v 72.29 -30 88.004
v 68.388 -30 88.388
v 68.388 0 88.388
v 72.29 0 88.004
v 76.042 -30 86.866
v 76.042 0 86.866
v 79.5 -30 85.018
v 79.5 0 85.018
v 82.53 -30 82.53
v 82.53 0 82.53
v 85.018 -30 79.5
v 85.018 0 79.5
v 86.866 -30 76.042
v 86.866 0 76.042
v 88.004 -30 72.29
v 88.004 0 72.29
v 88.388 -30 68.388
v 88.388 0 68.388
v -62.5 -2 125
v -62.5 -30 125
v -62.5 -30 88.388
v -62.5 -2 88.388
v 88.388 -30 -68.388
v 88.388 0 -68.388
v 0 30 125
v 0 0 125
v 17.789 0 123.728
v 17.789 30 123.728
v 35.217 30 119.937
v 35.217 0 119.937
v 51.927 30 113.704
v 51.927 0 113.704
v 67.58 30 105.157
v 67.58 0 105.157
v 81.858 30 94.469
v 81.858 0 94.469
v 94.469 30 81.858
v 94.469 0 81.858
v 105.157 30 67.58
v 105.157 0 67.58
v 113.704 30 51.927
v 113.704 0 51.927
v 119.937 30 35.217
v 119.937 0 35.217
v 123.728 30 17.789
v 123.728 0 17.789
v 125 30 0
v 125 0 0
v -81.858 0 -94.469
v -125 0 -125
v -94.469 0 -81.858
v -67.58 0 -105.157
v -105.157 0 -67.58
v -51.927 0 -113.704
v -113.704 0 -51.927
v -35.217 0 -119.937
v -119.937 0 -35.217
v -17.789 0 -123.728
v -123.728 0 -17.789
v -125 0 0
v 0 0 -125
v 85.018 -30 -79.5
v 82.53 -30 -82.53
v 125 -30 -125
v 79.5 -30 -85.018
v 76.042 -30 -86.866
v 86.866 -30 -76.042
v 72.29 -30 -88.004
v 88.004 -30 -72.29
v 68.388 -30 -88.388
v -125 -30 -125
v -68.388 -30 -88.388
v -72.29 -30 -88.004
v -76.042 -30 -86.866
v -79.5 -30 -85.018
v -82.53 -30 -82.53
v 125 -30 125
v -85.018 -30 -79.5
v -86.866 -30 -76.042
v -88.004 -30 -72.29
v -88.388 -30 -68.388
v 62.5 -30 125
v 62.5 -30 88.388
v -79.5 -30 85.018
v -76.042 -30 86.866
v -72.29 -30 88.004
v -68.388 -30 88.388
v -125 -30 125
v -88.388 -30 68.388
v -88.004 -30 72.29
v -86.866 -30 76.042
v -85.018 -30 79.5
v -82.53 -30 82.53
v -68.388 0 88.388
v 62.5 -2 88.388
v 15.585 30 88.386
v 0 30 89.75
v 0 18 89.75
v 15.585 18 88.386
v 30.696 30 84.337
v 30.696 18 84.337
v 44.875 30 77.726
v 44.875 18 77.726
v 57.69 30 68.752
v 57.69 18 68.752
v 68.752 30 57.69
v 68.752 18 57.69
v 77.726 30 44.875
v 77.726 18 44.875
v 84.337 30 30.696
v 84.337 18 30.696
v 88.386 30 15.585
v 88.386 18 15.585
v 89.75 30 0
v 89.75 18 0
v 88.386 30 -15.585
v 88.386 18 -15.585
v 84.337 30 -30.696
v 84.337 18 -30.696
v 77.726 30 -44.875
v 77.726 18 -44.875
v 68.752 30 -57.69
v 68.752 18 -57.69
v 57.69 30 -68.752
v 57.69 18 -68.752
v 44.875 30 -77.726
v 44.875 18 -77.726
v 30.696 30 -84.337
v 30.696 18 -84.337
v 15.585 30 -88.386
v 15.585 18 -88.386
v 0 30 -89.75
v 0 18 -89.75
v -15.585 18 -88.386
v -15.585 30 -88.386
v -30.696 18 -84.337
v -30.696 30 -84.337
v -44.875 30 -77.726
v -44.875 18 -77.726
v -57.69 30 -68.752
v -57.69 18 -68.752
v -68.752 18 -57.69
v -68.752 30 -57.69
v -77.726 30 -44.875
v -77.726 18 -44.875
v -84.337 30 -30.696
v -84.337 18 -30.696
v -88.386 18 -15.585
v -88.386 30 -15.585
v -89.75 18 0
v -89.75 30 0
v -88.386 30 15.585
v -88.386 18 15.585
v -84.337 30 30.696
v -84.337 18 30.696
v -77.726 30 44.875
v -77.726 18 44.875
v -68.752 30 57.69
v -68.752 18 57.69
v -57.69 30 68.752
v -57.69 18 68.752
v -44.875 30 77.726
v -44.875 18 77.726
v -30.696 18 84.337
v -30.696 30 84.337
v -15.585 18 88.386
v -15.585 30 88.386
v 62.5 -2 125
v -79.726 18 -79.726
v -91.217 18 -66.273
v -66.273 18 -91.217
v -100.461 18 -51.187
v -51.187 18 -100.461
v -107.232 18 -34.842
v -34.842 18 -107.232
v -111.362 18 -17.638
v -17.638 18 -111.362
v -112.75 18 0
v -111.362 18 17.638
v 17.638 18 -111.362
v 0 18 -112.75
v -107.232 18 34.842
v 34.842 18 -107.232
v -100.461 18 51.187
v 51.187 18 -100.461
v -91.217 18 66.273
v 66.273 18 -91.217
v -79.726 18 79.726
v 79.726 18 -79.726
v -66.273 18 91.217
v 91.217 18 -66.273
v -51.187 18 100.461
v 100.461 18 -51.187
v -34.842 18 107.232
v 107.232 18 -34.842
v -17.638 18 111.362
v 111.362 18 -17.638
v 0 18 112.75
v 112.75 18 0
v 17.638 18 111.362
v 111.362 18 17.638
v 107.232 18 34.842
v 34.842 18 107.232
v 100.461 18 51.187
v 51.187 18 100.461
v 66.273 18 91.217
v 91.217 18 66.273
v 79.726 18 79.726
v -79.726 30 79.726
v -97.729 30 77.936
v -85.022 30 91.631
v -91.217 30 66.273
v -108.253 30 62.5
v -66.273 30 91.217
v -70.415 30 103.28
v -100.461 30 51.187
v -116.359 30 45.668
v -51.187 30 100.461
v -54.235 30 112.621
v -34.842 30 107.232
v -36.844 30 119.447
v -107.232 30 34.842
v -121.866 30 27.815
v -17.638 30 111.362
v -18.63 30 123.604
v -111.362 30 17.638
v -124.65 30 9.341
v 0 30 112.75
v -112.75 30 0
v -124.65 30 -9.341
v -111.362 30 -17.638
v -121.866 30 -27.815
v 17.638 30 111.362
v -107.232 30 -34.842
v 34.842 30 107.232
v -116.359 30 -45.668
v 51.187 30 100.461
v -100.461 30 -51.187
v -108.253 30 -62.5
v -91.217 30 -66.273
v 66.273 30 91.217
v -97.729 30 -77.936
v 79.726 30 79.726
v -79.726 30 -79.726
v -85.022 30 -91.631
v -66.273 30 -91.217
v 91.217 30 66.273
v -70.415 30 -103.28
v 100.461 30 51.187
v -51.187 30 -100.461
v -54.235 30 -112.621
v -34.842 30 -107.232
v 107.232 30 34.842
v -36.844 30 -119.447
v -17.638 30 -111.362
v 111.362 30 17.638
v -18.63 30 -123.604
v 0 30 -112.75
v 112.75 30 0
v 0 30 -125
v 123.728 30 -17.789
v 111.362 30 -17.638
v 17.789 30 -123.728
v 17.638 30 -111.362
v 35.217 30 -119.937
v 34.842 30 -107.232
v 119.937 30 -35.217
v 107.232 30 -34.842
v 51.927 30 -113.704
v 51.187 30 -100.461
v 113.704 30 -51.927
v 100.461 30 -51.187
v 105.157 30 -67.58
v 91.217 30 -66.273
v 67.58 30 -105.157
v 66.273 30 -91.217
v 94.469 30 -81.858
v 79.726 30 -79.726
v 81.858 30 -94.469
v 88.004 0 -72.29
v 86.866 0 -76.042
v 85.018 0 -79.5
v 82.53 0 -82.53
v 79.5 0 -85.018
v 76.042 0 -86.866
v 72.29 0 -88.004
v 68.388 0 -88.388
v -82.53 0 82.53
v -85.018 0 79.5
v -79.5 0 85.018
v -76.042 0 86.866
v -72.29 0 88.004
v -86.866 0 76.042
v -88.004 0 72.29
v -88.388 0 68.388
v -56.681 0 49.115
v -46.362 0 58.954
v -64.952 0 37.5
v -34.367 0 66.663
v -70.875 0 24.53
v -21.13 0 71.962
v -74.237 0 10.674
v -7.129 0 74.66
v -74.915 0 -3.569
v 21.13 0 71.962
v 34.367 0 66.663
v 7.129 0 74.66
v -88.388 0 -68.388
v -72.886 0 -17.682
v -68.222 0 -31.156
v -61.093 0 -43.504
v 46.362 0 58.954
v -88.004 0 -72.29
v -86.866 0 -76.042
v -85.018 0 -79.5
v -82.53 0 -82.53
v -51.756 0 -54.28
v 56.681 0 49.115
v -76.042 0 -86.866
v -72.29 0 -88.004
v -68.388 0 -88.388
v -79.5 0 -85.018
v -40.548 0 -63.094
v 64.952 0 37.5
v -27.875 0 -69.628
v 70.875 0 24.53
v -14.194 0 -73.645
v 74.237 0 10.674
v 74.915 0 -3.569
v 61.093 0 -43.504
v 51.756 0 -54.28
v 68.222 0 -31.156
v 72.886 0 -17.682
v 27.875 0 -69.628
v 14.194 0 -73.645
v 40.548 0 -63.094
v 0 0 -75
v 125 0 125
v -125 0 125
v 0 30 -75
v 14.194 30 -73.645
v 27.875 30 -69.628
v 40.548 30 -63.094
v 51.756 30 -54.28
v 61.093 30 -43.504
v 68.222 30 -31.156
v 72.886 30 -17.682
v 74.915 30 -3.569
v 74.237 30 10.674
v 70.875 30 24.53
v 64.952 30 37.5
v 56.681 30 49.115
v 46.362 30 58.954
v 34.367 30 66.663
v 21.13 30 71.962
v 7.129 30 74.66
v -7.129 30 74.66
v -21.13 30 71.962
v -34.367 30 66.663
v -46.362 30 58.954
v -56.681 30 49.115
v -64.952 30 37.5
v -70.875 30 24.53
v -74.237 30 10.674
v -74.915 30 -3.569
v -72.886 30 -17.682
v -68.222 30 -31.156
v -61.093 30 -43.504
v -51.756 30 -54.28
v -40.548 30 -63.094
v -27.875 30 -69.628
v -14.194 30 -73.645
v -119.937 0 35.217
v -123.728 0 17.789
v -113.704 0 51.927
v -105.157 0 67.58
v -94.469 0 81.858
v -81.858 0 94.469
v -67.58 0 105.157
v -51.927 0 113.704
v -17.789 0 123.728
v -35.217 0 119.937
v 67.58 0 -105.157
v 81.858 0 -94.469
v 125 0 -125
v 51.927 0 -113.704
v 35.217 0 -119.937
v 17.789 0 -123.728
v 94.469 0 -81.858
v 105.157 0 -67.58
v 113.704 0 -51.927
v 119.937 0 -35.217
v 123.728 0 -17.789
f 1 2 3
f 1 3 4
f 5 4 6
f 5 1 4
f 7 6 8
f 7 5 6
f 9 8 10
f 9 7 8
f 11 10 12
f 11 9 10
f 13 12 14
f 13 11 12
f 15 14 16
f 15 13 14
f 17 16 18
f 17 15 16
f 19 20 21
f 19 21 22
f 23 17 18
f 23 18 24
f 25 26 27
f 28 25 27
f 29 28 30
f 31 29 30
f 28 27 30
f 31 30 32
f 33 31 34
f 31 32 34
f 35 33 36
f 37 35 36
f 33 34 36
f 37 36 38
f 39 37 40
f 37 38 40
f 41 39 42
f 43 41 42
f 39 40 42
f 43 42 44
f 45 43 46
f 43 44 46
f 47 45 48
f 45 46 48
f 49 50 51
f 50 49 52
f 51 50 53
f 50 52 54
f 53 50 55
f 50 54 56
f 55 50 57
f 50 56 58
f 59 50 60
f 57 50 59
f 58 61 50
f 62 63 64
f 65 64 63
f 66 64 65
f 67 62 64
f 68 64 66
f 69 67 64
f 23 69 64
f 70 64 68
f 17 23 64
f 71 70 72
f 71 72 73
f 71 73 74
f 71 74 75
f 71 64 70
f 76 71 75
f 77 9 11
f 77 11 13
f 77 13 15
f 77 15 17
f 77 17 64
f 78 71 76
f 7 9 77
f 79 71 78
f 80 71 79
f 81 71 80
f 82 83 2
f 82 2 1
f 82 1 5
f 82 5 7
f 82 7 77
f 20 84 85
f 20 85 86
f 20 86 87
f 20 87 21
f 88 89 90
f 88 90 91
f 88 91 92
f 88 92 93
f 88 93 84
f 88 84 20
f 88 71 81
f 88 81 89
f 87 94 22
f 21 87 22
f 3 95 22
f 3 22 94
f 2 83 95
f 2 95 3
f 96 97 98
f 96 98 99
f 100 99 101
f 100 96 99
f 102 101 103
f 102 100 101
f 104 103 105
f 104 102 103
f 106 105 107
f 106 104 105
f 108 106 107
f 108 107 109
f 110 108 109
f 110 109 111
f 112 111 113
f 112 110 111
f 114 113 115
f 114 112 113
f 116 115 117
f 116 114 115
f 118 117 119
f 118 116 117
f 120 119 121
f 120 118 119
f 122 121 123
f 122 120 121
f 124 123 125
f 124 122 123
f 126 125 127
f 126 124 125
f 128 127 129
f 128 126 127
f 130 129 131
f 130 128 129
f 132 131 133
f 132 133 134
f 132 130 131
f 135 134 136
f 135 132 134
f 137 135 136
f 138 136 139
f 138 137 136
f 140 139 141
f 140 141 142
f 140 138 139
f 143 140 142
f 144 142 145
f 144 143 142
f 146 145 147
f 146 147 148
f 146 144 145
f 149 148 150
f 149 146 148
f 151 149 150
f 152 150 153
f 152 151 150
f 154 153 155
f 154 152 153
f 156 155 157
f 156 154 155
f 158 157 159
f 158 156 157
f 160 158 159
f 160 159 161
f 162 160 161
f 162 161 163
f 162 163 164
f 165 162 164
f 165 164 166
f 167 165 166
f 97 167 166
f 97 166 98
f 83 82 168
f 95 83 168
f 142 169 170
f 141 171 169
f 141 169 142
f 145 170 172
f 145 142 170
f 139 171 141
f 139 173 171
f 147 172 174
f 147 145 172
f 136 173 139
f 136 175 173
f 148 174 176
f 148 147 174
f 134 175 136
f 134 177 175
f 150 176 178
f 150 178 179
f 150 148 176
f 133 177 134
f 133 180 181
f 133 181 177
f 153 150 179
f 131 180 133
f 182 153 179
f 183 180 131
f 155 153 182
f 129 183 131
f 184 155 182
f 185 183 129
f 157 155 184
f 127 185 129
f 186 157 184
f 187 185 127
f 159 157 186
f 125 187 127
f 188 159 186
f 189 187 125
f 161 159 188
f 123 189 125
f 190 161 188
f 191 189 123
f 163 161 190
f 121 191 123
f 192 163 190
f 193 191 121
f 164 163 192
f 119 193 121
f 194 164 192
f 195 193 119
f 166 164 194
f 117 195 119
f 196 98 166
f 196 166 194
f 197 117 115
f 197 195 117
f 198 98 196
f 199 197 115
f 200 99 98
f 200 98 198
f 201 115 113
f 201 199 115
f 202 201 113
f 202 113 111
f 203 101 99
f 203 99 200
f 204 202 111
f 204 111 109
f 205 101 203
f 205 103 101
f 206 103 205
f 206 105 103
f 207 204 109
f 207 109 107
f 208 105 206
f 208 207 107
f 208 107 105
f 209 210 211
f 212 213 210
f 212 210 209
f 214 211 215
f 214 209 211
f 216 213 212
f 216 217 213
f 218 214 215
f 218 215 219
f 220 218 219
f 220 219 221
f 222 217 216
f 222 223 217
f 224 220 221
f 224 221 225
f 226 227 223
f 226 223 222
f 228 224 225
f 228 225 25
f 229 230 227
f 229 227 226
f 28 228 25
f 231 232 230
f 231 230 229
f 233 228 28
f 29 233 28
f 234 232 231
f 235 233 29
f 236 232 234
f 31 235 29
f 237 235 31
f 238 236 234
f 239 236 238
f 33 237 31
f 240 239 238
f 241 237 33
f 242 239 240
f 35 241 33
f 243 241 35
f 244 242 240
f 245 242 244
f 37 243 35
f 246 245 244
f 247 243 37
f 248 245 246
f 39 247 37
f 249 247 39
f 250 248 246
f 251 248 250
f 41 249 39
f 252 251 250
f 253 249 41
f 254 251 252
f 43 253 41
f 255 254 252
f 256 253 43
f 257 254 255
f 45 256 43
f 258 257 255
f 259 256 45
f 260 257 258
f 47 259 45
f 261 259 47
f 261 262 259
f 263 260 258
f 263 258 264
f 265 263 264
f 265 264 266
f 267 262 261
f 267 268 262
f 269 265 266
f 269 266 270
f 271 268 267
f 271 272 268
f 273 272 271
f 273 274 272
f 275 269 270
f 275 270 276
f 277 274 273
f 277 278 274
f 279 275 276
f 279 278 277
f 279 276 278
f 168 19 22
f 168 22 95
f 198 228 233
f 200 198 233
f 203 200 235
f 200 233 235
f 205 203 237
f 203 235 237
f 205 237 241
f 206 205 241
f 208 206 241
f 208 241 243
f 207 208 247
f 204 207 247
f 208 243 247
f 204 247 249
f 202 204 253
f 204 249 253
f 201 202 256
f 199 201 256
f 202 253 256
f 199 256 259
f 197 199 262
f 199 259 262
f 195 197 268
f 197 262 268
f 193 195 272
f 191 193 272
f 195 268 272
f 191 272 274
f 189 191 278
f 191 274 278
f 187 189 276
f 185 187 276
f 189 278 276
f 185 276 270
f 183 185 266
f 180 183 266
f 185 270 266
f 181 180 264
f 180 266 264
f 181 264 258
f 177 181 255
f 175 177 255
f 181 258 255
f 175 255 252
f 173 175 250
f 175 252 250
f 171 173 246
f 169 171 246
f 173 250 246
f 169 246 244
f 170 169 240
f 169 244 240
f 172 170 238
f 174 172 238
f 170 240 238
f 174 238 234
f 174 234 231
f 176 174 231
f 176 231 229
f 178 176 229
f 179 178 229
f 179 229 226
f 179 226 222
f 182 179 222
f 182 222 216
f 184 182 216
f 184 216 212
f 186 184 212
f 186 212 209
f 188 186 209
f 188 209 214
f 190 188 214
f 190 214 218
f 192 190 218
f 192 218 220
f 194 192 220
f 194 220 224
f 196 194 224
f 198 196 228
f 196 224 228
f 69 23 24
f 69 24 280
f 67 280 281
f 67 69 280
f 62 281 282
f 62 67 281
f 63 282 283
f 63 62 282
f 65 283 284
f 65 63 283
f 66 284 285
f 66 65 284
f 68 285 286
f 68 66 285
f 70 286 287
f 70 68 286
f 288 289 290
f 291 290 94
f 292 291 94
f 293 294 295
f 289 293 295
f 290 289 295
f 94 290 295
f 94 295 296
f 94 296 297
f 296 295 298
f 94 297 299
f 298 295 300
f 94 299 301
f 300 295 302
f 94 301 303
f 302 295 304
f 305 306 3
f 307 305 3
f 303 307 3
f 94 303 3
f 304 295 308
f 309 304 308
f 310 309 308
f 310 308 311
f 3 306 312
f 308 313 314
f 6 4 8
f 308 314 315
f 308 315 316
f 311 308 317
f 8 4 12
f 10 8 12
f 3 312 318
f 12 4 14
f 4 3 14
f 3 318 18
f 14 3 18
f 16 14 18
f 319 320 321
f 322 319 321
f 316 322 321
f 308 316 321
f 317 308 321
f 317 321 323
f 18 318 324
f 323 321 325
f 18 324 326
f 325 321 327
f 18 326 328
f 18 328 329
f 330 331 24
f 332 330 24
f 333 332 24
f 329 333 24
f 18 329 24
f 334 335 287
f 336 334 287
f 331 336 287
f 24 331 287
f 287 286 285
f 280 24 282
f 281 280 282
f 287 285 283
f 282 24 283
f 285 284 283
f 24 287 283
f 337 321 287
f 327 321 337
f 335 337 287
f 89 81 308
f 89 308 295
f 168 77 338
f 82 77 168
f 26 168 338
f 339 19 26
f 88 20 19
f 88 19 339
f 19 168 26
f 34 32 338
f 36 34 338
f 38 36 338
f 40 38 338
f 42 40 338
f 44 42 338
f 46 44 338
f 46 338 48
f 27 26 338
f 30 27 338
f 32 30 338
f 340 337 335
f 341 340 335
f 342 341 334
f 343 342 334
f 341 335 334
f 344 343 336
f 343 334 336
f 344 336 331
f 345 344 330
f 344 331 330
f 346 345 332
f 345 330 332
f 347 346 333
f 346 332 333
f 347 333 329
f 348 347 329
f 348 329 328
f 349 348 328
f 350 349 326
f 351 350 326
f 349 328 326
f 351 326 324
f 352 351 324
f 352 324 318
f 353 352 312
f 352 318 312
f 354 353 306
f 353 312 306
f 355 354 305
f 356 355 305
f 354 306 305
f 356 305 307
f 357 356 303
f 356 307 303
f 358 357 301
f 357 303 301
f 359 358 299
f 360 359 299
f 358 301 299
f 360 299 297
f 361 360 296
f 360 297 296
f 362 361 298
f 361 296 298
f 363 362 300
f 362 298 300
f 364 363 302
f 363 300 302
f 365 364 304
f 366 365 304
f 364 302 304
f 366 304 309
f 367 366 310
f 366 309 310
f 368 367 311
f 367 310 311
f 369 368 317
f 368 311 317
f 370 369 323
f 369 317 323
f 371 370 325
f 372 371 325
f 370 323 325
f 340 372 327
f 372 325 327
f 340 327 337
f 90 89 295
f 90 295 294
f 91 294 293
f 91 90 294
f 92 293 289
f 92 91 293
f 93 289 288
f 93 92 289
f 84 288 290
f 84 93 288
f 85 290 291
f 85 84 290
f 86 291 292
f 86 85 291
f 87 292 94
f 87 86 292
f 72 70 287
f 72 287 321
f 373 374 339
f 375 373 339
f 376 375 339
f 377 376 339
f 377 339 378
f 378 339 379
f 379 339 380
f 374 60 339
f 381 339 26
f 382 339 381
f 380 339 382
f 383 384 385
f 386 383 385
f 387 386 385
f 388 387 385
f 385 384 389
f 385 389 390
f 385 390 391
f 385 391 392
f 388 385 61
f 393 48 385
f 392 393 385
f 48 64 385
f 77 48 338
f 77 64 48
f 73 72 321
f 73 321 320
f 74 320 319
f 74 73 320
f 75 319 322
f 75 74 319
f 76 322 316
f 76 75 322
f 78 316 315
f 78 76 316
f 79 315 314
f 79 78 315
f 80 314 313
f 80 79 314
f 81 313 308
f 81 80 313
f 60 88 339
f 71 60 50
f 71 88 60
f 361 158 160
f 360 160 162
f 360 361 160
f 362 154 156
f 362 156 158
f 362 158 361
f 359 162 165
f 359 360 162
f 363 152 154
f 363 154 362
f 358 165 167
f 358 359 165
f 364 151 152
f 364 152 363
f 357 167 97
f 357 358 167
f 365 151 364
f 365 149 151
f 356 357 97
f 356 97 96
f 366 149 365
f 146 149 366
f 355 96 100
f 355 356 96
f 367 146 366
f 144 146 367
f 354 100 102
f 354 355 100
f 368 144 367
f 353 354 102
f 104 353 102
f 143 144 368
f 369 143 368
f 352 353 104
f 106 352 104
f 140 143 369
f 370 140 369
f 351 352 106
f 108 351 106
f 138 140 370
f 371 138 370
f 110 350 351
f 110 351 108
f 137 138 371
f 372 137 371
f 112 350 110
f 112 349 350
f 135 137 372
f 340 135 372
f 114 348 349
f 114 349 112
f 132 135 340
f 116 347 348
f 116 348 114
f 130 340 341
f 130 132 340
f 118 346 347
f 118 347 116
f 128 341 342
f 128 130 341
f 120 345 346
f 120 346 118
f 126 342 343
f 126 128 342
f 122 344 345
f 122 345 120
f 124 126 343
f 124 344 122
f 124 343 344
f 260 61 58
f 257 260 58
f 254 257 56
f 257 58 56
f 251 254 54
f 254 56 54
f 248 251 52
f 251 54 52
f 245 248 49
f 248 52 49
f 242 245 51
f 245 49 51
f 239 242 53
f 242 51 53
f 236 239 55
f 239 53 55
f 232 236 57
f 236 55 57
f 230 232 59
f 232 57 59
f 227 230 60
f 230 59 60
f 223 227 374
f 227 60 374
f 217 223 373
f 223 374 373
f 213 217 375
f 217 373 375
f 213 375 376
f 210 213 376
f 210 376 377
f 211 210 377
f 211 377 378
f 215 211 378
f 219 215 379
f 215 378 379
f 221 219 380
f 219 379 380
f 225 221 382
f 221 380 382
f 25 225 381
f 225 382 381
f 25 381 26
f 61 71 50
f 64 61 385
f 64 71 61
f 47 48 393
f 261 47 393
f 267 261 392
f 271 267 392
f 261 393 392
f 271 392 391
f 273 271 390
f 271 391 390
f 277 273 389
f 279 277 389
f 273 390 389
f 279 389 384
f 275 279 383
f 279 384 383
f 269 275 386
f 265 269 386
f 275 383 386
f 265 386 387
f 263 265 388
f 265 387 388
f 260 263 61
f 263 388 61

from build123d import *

# Parameters (mm, degrees)
AUFSATZ_LINEAR_AUSTRAGEN1_DEPTH = 30
SKIZZE2_R                       = 112.75
SKIZZE2_R_2                     = 89.75
SCHNITT_LINEAR_AUSTRAGEN1_DEPTH = 12
AUFSATZ_LINEAR_START            = 30
SKIZZE3_R                       = 125
AUFSATZ_LINEAR_AUSTRAGEN2_DEPTH = 30
SKIZZE4_W                       = 125
SKIZZE4_H                       = 28
SCHNITT_LINEAR_AUSTRAGEN2_DEPTH = 37


with BuildPart() as part:
    # Skizze1 → Aufsatz-Linear austragen1 (new body)
    with BuildSketch(Plane(origin=(0, 0, 0), x_dir=(1, 0, 0), z_dir=(0, 1, 0))):
        with BuildLine():
            ThreePointArc((0, 125), (-125, 0), (0, -125))
            Line((0, -125), (0, -112.75))
            ThreePointArc((0, -112.75), (-112.75, 0), (0, 112.75))
            Line((0, 112.75), (0, 125))
        make_face()
        with BuildLine():
            Line((0, -112.75), (0, -125))
            ThreePointArc((0, -125), (88.388347648, -88.388347648), (125, 0))
            ThreePointArc((125, 0), (88.388347648, 88.388347648), (0, 125))
            Line((0, 125), (0, 112.75))
            ThreePointArc((0, 112.75), (79.726289579, 79.726289579), (112.75, 0))
            ThreePointArc((112.75, 0), (79.726289579, -79.726289579), (0, -112.75))
        make_face()
        with BuildLine():
            ThreePointArc((0, 112.75), (-112.75, 0), (0, -112.75))
            Line((0, -112.75), (0, -89.75))
            ThreePointArc((0, -89.75), (-89.75, 0), (0, 89.75))
            Line((0, 89.75), (0, 112.75))
        make_face()
        with BuildLine():
            Line((0, -89.75), (0, -112.75))
            ThreePointArc((0, -112.75), (79.726289579, -79.726289579), (112.75, 0))
            ThreePointArc((112.75, 0), (79.726289579, 79.726289579), (0, 112.75))
            Line((0, 112.75), (0, 89.75))
            ThreePointArc((0, 89.75), (63.462833611, 63.462833611), (89.75, 0))
            ThreePointArc((89.75, 0), (63.462833611, -63.462833611), (0, -89.75))
        make_face()
        with BuildLine():
            ThreePointArc((0, 89.75), (-89.75, 0), (0, -89.75))
            Line((0, -89.75), (0, -75))
            ThreePointArc((0, -75), (-75, 0), (0, 75))
            Line((0, 75), (0, 89.75))
        make_face()
        with BuildLine():
            Line((0, -75), (0, -89.75))
            ThreePointArc((0, -89.75), (63.462833611, -63.462833611), (89.75, 0))
            ThreePointArc((89.75, 0), (63.462833611, 63.462833611), (0, 89.75))
            Line((0, 89.75), (0, 75))
            ThreePointArc((0, 75), (53.033008589, 53.033008589), (75, 0))
            ThreePointArc((75, 0), (53.033008589, -53.033008589), (0, -75))
        make_face()
    extrude(amount=AUFSATZ_LINEAR_AUSTRAGEN1_DEPTH)

    # Skizze2 → Schnitt-Linear austragen1 (cut)
    with BuildSketch(Plane(origin=(0, 30, 0), x_dir=(1, 0, 0), z_dir=(0, 1, 0))):
        with Locations(Location((0, 0, 0), (0, 0, 270))):
            Circle(SKIZZE2_R)
        with Locations(Location((0, 0, 0), (0, 0, 270))):
            Circle(SKIZZE2_R_2, mode=Mode.SUBTRACT)
    extrude(amount=-SCHNITT_LINEAR_AUSTRAGEN1_DEPTH, mode=Mode.SUBTRACT)

    # Skizze3 → Aufsatz-Linear austragen2 (add)
    # profile 1 of 5: a face of its own
    with BuildSketch(Plane.XZ.offset(AUFSATZ_LINEAR_START)):
        with Locations(Location((0, 0, 0), (0, 0, 90))):
            Circle(SKIZZE3_R)
        with BuildLine():
            Line((-88.388347648, -68.388347648), (-88.388347648, 68.388347648))
            ThreePointArc((-88.388347648, 68.388347648), (-82.530483272, 82.530483272), (-68.388347648, 88.388347648))
            Line((-68.388347648, 88.388347648), (68.388347648, 88.388347648))
            ThreePointArc((68.388347648, 88.388347648), (82.530483272, 82.530483272), (88.388347648, 68.388347648))
            Line((88.388347648, 68.388347648), (88.388347648, -68.388347648))
            ThreePointArc((88.388347648, -68.388347648), (82.530483272, -82.530483272), (68.388347648, -88.388347648))
            Line((68.388347648, -88.388347648), (-68.388347648, -88.388347648))
            ThreePointArc((-68.388347648, -88.388347648), (-82.530483272, -82.530483272), (-88.388347648, -68.388347648))
        make_face(mode=Mode.SUBTRACT)
    # profile 2 of 5: a face of its own
    with BuildSketch(Plane.XZ.offset(AUFSATZ_LINEAR_START)):
        with BuildLine():
            Line((-125, 125), (-125, 1.53e-07))
            ThreePointArc((-125, 1.53e-07), (-88.388347573, 88.388347723), (5.9e-08, 125))
            Line((5.9e-08, 125), (-125, 125))
        make_face()
    # profile 3 of 5: a face of its own
    with BuildSketch(Plane.XZ.offset(AUFSATZ_LINEAR_START)):
        with BuildLine():
            ThreePointArc((5.9e-08, 125), (88.388347669, 88.388347627), (125, 0))
            Line((125, 0), (125, 125))
            Line((125, 125), (5.9e-08, 125))
        make_face()
    # profile 4 of 5: a face of its own
    with BuildSketch(Plane.XZ.offset(AUFSATZ_LINEAR_START)):
        with BuildLine():
            ThreePointArc((125, 0), (88.388347702, -88.388347594), (1.52e-07, -125))
            Line((1.52e-07, -125), (125, -125))
            Line((125, -125), (125, 0))
        make_face()
    # profile 5 of 5: a face of its own
    with BuildSketch(Plane.XZ.offset(AUFSATZ_LINEAR_START)):
        with BuildLine():
            Line((-125, 1.53e-07), (-125, -125))
            Line((-125, -125), (1.52e-07, -125))
            ThreePointArc((1.52e-07, -125), (-88.388347648, -88.388347648), (-125, 1.53e-07))
        make_face()
    extrude(amount=-AUFSATZ_LINEAR_AUSTRAGEN2_DEPTH)

    # Skizze4 → Schnitt-Linear austragen2 (cut)
    with BuildSketch(Plane.XY.offset(125)):
        with Locations((0, -16)):
            Rectangle(SKIZZE4_W, SKIZZE4_H)
    extrude(amount=-SCHNITT_LINEAR_AUSTRAGEN2_DEPTH, mode=Mode.SUBTRACT)


solid = part.part
